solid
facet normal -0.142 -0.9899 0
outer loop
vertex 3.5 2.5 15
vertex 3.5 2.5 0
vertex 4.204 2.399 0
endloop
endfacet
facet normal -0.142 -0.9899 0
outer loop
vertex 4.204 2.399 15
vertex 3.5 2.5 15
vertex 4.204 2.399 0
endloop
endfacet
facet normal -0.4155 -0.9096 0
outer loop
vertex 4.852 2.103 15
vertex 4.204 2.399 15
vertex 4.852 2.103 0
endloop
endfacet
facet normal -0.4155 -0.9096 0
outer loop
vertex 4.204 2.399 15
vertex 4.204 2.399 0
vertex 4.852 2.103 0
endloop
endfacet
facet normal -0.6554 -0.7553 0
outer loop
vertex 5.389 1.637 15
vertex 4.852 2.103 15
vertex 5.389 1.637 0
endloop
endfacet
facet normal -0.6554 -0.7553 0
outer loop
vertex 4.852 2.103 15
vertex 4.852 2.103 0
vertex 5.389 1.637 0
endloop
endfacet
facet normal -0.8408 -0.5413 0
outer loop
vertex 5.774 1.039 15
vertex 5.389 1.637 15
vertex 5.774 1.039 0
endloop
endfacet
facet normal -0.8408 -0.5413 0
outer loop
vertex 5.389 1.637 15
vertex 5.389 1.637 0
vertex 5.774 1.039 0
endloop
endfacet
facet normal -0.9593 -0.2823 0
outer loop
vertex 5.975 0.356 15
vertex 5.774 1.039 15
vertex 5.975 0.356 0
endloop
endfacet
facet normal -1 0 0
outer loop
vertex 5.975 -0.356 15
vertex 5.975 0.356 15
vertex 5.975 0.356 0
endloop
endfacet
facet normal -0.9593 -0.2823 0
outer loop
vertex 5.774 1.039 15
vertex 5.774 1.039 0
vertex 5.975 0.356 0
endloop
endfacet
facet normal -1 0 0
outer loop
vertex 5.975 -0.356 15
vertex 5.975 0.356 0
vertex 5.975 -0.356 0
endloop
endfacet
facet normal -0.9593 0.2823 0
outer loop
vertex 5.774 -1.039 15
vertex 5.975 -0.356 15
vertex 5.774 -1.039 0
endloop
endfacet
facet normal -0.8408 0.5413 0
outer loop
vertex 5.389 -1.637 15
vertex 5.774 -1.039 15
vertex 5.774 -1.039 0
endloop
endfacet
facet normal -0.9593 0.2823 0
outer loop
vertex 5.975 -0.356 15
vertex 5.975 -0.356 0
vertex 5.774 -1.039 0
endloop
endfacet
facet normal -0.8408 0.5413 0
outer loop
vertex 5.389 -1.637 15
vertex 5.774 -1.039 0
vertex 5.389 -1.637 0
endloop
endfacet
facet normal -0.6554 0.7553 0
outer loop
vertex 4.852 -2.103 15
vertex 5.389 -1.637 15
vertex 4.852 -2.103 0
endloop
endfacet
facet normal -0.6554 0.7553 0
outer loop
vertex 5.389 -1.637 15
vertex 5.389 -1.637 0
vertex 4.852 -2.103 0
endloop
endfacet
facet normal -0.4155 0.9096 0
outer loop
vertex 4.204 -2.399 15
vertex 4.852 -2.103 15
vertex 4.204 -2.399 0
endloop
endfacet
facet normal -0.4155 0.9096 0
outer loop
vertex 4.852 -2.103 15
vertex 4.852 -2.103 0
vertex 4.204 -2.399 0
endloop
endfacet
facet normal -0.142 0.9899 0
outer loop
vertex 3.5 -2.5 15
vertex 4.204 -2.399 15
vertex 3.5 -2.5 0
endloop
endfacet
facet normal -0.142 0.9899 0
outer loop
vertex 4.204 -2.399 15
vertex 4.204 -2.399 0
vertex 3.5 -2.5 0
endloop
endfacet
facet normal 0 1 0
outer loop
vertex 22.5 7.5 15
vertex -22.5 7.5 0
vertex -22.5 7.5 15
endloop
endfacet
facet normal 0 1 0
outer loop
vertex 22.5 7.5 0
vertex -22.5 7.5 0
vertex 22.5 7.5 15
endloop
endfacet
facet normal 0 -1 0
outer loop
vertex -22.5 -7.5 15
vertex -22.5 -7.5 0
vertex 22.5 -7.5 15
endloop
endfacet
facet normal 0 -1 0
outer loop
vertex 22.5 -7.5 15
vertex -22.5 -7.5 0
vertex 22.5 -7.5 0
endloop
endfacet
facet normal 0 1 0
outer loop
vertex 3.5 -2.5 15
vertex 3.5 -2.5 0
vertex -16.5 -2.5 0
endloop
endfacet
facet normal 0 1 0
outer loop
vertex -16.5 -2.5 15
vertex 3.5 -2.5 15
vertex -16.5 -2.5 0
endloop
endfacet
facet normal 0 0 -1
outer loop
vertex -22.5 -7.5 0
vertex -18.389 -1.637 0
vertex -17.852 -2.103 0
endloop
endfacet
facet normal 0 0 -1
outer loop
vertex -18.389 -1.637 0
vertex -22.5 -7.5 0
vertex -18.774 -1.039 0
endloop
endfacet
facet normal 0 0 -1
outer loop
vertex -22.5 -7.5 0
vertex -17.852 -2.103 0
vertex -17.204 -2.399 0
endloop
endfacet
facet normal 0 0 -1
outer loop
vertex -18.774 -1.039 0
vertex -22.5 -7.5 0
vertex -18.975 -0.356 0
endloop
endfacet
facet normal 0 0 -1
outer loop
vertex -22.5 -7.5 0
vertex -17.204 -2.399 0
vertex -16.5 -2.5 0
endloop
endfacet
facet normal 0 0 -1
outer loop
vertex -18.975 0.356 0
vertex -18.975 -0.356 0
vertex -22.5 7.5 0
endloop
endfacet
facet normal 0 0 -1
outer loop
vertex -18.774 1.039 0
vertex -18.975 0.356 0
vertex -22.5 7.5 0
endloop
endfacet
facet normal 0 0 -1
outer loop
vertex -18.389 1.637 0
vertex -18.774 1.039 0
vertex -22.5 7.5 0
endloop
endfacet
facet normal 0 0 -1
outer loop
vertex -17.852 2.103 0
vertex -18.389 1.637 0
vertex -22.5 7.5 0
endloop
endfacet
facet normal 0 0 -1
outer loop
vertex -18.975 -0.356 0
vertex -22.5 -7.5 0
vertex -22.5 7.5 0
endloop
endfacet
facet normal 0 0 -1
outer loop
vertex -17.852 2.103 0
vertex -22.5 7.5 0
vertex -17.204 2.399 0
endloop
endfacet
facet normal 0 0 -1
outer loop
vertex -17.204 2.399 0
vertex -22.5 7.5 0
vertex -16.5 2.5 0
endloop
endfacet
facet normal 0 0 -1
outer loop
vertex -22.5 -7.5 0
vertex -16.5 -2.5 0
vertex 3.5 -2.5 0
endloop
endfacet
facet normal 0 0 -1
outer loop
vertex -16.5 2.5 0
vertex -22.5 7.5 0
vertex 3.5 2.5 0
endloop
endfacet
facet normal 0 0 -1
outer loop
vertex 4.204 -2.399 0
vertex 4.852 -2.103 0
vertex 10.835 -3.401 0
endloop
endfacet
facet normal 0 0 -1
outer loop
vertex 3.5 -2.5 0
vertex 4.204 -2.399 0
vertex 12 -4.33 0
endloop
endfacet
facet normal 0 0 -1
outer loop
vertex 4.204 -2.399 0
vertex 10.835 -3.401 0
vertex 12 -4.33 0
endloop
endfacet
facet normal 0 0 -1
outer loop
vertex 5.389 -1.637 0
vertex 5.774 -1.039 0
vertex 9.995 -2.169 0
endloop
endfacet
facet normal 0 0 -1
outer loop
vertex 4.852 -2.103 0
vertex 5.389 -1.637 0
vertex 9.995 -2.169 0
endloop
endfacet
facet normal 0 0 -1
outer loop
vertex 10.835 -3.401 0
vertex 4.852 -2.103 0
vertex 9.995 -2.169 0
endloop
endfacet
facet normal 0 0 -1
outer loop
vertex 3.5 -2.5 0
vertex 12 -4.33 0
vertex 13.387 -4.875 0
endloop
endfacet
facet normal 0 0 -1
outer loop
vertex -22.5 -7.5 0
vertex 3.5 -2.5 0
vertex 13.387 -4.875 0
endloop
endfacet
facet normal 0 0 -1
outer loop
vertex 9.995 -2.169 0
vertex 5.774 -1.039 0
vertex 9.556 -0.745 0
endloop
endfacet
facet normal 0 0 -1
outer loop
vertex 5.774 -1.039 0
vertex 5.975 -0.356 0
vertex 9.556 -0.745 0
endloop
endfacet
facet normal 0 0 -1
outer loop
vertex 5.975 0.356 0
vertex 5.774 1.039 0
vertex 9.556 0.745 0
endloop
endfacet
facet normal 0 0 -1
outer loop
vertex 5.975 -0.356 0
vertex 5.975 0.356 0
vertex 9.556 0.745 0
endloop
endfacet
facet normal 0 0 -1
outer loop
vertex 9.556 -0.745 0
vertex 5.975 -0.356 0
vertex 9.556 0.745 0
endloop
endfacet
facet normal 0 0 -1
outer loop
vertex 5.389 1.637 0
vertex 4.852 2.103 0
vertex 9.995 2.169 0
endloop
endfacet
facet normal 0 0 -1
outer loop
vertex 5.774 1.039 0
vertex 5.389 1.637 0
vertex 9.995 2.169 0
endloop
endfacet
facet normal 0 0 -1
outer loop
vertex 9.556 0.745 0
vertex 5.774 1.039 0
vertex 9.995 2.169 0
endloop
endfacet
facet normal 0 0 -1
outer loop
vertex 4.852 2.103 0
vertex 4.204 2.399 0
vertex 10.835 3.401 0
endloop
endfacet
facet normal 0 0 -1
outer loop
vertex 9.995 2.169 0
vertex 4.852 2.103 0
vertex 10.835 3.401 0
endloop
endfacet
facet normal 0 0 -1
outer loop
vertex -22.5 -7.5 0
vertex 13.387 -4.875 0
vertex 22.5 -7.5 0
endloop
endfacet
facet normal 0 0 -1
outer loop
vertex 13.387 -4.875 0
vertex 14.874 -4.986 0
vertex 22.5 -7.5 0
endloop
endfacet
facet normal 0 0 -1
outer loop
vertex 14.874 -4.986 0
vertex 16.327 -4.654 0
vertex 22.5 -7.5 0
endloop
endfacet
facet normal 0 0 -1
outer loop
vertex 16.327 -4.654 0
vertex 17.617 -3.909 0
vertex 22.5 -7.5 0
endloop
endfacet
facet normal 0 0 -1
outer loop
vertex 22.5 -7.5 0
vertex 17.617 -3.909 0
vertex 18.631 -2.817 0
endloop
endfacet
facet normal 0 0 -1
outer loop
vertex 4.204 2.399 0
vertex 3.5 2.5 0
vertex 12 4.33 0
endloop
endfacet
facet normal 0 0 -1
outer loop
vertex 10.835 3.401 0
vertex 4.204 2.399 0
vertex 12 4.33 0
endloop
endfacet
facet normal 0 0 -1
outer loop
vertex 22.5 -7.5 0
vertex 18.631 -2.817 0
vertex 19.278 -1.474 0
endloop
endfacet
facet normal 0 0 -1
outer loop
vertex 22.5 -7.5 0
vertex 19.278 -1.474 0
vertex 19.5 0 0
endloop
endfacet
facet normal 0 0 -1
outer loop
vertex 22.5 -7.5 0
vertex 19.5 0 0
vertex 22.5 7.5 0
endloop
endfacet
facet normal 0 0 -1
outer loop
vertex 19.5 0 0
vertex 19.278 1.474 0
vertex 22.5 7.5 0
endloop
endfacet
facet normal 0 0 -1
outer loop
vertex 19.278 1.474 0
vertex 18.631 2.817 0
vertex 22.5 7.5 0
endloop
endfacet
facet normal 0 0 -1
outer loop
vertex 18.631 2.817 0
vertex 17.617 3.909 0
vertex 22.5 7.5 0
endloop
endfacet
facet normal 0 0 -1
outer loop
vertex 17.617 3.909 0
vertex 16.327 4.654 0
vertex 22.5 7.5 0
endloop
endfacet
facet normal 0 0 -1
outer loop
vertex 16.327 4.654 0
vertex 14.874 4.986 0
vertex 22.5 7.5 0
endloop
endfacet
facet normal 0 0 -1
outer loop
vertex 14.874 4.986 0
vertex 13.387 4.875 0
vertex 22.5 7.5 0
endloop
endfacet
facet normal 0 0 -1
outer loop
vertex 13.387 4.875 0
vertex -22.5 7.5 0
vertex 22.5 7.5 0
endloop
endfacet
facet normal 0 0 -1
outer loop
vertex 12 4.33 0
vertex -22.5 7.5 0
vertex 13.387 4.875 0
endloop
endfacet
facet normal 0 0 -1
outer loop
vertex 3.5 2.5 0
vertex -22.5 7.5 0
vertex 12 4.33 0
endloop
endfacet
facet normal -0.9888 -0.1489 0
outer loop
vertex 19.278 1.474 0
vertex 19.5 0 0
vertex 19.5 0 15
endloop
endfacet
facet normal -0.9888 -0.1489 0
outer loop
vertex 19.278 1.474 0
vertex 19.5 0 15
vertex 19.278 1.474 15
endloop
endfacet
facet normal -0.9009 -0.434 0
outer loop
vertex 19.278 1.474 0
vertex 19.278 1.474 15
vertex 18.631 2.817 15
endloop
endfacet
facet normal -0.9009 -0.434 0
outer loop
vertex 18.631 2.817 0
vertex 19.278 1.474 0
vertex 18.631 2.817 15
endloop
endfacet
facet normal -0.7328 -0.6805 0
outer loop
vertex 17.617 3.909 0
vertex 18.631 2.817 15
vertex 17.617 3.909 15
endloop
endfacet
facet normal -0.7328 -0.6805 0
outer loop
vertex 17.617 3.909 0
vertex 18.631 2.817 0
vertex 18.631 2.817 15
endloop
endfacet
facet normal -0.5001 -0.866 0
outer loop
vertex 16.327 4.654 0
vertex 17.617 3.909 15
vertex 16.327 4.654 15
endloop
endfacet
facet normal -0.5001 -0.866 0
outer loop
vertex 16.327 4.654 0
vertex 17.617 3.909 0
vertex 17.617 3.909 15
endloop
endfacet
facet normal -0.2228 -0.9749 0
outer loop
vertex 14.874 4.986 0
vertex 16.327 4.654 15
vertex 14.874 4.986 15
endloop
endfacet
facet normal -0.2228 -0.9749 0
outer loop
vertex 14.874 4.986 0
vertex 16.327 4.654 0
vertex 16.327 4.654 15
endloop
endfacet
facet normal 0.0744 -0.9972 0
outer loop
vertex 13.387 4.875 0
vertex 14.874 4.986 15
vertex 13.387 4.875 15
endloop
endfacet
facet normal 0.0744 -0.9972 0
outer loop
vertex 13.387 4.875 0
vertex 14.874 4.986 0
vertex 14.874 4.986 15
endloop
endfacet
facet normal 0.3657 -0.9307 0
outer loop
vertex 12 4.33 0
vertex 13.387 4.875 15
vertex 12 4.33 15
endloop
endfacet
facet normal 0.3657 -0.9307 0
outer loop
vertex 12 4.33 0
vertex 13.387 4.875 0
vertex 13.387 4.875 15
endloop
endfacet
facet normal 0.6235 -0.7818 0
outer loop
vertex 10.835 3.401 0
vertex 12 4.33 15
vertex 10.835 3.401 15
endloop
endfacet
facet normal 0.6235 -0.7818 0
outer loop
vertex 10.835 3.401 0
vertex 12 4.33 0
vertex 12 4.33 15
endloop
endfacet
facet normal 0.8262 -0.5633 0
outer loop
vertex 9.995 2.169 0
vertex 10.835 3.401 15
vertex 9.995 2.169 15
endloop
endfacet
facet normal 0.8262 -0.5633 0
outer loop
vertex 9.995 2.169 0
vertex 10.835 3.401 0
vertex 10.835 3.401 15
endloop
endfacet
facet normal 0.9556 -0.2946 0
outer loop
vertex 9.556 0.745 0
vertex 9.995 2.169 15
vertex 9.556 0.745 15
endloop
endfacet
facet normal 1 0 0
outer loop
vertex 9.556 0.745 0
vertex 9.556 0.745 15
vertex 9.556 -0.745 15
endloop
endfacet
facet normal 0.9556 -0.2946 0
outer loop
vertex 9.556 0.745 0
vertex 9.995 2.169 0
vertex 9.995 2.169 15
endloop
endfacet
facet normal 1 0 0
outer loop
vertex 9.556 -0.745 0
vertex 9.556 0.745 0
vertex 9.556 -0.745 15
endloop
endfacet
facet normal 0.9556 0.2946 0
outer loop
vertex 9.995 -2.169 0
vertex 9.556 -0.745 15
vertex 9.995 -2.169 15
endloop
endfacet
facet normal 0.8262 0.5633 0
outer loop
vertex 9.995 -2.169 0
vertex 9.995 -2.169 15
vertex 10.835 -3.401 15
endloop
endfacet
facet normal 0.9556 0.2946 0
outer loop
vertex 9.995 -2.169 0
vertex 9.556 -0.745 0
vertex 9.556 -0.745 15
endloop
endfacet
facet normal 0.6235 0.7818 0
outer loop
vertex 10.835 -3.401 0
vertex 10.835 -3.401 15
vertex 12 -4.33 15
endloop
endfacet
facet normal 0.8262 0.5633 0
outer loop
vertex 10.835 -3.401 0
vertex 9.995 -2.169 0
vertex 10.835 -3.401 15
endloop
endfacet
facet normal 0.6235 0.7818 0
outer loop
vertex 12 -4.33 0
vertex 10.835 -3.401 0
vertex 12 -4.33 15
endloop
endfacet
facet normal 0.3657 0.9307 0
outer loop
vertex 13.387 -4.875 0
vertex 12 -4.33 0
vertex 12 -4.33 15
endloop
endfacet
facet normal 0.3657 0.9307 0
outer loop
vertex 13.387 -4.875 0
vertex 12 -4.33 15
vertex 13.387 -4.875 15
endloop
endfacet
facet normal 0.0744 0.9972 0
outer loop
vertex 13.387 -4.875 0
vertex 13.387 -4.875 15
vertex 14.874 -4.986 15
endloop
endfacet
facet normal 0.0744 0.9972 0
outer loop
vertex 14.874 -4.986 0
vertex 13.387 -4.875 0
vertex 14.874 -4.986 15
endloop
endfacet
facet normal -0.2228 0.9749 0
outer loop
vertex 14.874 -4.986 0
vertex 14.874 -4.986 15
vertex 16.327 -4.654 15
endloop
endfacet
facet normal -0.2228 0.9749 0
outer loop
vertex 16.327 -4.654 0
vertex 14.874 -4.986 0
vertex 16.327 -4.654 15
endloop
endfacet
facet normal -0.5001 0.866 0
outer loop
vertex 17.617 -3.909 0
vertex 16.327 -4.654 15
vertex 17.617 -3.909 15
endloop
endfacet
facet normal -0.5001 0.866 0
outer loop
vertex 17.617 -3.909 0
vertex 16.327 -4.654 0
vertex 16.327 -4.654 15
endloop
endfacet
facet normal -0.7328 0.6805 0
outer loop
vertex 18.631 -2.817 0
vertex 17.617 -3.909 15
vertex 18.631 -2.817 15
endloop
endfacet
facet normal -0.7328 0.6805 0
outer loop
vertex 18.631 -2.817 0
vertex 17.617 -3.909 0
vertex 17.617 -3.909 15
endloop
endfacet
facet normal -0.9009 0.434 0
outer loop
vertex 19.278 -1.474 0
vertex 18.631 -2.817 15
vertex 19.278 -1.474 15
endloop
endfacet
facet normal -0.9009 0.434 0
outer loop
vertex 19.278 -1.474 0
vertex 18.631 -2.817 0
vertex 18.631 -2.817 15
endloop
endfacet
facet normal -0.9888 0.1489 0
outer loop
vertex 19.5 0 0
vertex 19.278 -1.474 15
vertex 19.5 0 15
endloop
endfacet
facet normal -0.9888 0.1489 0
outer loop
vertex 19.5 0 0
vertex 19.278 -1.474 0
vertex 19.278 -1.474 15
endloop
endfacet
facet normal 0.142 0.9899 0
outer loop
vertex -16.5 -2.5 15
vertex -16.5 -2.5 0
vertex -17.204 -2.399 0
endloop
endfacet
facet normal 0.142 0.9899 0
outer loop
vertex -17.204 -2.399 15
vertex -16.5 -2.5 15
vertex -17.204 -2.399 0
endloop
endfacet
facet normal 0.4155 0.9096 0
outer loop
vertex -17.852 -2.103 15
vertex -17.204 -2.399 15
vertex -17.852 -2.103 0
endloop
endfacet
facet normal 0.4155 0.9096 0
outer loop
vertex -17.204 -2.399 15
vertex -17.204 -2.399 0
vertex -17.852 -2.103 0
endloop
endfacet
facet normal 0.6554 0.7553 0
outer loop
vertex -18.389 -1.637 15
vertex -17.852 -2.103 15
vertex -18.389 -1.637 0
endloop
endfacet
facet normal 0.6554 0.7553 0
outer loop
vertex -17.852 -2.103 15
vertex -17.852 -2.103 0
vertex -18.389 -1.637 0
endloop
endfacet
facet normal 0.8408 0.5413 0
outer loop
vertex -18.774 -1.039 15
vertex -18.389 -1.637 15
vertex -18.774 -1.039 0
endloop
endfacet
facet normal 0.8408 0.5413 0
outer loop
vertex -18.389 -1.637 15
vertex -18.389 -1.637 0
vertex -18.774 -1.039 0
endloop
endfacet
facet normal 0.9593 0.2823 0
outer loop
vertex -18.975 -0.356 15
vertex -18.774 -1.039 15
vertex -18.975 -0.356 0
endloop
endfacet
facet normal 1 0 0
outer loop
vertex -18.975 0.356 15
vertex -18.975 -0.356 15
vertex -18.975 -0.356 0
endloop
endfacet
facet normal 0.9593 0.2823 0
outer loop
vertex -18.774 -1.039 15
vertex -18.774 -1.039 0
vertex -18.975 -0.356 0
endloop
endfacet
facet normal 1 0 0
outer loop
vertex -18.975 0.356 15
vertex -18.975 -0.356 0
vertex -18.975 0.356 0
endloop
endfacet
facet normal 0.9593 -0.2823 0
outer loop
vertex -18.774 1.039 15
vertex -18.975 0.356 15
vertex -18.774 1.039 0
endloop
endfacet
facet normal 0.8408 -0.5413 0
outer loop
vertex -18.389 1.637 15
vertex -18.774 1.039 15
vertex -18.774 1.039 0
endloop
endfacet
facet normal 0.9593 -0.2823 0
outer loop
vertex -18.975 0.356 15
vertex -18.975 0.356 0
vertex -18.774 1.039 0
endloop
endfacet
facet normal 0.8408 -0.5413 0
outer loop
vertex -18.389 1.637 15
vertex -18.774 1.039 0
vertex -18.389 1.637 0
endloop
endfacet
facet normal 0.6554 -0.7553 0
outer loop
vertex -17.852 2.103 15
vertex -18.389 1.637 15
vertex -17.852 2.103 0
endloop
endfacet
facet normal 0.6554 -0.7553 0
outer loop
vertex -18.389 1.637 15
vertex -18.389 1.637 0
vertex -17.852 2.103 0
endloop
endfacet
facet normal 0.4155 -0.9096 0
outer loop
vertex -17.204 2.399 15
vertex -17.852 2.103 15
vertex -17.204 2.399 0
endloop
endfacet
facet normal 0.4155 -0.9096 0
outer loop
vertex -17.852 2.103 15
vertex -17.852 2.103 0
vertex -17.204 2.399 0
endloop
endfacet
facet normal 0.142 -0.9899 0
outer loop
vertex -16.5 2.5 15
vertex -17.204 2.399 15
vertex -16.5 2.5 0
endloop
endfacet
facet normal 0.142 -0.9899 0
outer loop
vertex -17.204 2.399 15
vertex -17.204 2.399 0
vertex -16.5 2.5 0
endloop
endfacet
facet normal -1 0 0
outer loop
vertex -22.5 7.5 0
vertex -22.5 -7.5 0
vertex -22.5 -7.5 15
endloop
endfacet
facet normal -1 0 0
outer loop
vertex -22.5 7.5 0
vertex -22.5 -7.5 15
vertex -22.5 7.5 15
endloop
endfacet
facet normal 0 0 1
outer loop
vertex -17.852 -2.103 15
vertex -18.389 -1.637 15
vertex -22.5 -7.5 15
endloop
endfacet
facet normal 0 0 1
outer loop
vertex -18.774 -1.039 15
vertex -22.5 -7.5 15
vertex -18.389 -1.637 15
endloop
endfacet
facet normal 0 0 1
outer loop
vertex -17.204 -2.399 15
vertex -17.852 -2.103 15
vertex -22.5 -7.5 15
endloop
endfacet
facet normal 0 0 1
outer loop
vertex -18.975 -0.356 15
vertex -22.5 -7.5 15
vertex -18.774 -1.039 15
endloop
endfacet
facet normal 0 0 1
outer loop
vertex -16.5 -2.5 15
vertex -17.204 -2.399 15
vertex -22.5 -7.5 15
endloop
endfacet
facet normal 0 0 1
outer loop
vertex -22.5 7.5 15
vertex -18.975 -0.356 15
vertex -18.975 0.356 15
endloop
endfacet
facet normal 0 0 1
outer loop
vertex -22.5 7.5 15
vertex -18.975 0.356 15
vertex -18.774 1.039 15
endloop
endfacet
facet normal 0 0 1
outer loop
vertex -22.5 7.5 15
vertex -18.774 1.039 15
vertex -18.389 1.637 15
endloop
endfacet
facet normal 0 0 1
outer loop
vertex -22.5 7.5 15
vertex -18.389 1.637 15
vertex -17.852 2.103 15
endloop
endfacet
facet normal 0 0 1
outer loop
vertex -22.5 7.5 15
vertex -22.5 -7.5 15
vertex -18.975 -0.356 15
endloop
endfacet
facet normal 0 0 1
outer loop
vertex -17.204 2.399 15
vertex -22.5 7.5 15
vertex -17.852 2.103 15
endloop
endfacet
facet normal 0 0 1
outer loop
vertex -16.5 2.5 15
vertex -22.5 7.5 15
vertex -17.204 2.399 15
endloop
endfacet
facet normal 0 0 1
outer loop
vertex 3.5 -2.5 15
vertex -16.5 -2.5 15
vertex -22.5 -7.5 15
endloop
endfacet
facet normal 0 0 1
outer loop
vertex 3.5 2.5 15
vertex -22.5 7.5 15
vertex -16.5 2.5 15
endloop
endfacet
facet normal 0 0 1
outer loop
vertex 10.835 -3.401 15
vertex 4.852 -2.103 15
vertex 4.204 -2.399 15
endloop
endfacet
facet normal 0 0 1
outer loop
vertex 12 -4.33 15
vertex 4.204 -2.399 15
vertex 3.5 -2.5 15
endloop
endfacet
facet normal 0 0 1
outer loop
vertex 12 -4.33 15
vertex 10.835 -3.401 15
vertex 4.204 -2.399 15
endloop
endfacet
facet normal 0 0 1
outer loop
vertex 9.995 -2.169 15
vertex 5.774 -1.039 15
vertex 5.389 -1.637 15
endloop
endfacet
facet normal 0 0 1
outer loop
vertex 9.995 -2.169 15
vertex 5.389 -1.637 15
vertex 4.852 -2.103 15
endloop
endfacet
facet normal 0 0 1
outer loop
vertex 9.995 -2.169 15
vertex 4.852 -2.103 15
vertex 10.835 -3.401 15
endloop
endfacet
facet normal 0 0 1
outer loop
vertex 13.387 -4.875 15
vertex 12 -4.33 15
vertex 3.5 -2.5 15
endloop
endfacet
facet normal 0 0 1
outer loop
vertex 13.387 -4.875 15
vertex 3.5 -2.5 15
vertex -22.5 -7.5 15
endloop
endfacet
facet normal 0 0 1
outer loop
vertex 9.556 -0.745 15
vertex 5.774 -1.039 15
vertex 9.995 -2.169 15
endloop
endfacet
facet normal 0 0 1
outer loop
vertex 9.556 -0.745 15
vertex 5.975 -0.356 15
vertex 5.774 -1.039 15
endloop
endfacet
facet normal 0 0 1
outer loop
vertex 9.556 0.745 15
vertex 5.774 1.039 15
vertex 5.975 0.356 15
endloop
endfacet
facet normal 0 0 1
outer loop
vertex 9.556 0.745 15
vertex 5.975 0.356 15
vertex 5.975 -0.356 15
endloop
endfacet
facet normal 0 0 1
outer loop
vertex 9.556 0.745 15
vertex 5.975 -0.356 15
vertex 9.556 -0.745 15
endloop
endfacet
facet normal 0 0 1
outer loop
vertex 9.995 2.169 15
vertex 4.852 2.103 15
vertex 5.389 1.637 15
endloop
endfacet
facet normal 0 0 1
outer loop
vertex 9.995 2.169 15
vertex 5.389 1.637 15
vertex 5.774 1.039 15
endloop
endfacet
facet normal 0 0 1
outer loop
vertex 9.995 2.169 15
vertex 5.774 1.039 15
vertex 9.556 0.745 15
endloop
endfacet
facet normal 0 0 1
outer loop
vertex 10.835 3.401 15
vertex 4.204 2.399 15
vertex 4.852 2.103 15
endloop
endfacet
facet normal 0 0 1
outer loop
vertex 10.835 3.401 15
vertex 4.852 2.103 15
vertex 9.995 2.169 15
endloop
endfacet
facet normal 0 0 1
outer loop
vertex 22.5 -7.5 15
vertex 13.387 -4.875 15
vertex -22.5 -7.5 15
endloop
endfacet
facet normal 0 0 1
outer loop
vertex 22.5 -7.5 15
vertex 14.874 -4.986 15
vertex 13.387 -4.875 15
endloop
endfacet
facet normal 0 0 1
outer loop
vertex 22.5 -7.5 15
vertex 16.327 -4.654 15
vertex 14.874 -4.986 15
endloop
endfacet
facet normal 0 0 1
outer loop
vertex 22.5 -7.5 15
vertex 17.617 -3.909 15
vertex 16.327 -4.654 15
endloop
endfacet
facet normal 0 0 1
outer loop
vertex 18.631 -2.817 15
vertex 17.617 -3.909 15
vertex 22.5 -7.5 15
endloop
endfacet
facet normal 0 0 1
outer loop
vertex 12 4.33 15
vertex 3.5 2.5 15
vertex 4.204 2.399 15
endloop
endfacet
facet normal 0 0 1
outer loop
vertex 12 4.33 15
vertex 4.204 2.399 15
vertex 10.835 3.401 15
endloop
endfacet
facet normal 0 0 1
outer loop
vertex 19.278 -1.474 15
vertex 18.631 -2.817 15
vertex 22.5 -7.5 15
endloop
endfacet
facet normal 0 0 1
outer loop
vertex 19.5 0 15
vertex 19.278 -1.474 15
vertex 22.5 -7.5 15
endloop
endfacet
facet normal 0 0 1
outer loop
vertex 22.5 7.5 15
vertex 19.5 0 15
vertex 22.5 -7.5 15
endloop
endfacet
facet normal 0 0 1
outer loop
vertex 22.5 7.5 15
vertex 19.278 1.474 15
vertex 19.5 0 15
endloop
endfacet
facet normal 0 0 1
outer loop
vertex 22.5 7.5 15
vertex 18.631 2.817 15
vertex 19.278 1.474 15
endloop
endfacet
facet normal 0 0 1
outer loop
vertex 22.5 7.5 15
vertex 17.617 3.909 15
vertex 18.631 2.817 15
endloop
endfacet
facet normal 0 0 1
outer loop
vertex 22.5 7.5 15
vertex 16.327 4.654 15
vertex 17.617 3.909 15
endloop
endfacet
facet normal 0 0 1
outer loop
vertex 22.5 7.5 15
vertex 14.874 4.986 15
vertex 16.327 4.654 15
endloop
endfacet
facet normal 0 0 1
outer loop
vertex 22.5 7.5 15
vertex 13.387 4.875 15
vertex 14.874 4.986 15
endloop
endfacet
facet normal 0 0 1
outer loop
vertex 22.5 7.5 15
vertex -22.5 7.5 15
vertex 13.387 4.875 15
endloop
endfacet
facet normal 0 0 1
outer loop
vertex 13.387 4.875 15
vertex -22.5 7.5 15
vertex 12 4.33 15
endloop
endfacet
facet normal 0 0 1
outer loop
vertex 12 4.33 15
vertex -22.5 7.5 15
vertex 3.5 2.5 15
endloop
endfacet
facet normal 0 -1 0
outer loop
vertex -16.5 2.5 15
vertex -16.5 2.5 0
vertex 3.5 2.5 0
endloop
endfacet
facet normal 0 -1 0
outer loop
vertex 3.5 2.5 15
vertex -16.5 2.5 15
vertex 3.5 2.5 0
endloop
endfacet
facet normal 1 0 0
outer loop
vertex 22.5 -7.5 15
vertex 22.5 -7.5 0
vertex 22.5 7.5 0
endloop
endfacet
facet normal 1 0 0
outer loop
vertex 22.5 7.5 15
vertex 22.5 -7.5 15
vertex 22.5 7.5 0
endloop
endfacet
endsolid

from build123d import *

# Parameters (mm, degrees)
SKETCH1_W           = 45
SKETCH1_H           = 15
SKETCH1_R           = 5
BOSS_EXTRUDE1_DEPTH = 15


with BuildPart() as part:
    # Sketch1 → Boss-Extrude1 (new body)
    with BuildSketch(Plane.XY):
        Rectangle(SKETCH1_W, SKETCH1_H)
        with Locations((14.5, 0)):
            Circle(SKETCH1_R, mode=Mode.SUBTRACT)
        with BuildLine():
            Line((3.5, -2.5), (-16.5, -2.5))
            ThreePointArc((-16.5, -2.5), (-19, 0), (-16.5, 2.5))
            Line((-16.5, 2.5), (3.5, 2.5))
            ThreePointArc((3.5, 2.5), (6, 0), (3.5, -2.5))
        make_face(mode=Mode.SUBTRACT)
    extrude(amount=BOSS_EXTRUDE1_DEPTH)


solid = part.part
